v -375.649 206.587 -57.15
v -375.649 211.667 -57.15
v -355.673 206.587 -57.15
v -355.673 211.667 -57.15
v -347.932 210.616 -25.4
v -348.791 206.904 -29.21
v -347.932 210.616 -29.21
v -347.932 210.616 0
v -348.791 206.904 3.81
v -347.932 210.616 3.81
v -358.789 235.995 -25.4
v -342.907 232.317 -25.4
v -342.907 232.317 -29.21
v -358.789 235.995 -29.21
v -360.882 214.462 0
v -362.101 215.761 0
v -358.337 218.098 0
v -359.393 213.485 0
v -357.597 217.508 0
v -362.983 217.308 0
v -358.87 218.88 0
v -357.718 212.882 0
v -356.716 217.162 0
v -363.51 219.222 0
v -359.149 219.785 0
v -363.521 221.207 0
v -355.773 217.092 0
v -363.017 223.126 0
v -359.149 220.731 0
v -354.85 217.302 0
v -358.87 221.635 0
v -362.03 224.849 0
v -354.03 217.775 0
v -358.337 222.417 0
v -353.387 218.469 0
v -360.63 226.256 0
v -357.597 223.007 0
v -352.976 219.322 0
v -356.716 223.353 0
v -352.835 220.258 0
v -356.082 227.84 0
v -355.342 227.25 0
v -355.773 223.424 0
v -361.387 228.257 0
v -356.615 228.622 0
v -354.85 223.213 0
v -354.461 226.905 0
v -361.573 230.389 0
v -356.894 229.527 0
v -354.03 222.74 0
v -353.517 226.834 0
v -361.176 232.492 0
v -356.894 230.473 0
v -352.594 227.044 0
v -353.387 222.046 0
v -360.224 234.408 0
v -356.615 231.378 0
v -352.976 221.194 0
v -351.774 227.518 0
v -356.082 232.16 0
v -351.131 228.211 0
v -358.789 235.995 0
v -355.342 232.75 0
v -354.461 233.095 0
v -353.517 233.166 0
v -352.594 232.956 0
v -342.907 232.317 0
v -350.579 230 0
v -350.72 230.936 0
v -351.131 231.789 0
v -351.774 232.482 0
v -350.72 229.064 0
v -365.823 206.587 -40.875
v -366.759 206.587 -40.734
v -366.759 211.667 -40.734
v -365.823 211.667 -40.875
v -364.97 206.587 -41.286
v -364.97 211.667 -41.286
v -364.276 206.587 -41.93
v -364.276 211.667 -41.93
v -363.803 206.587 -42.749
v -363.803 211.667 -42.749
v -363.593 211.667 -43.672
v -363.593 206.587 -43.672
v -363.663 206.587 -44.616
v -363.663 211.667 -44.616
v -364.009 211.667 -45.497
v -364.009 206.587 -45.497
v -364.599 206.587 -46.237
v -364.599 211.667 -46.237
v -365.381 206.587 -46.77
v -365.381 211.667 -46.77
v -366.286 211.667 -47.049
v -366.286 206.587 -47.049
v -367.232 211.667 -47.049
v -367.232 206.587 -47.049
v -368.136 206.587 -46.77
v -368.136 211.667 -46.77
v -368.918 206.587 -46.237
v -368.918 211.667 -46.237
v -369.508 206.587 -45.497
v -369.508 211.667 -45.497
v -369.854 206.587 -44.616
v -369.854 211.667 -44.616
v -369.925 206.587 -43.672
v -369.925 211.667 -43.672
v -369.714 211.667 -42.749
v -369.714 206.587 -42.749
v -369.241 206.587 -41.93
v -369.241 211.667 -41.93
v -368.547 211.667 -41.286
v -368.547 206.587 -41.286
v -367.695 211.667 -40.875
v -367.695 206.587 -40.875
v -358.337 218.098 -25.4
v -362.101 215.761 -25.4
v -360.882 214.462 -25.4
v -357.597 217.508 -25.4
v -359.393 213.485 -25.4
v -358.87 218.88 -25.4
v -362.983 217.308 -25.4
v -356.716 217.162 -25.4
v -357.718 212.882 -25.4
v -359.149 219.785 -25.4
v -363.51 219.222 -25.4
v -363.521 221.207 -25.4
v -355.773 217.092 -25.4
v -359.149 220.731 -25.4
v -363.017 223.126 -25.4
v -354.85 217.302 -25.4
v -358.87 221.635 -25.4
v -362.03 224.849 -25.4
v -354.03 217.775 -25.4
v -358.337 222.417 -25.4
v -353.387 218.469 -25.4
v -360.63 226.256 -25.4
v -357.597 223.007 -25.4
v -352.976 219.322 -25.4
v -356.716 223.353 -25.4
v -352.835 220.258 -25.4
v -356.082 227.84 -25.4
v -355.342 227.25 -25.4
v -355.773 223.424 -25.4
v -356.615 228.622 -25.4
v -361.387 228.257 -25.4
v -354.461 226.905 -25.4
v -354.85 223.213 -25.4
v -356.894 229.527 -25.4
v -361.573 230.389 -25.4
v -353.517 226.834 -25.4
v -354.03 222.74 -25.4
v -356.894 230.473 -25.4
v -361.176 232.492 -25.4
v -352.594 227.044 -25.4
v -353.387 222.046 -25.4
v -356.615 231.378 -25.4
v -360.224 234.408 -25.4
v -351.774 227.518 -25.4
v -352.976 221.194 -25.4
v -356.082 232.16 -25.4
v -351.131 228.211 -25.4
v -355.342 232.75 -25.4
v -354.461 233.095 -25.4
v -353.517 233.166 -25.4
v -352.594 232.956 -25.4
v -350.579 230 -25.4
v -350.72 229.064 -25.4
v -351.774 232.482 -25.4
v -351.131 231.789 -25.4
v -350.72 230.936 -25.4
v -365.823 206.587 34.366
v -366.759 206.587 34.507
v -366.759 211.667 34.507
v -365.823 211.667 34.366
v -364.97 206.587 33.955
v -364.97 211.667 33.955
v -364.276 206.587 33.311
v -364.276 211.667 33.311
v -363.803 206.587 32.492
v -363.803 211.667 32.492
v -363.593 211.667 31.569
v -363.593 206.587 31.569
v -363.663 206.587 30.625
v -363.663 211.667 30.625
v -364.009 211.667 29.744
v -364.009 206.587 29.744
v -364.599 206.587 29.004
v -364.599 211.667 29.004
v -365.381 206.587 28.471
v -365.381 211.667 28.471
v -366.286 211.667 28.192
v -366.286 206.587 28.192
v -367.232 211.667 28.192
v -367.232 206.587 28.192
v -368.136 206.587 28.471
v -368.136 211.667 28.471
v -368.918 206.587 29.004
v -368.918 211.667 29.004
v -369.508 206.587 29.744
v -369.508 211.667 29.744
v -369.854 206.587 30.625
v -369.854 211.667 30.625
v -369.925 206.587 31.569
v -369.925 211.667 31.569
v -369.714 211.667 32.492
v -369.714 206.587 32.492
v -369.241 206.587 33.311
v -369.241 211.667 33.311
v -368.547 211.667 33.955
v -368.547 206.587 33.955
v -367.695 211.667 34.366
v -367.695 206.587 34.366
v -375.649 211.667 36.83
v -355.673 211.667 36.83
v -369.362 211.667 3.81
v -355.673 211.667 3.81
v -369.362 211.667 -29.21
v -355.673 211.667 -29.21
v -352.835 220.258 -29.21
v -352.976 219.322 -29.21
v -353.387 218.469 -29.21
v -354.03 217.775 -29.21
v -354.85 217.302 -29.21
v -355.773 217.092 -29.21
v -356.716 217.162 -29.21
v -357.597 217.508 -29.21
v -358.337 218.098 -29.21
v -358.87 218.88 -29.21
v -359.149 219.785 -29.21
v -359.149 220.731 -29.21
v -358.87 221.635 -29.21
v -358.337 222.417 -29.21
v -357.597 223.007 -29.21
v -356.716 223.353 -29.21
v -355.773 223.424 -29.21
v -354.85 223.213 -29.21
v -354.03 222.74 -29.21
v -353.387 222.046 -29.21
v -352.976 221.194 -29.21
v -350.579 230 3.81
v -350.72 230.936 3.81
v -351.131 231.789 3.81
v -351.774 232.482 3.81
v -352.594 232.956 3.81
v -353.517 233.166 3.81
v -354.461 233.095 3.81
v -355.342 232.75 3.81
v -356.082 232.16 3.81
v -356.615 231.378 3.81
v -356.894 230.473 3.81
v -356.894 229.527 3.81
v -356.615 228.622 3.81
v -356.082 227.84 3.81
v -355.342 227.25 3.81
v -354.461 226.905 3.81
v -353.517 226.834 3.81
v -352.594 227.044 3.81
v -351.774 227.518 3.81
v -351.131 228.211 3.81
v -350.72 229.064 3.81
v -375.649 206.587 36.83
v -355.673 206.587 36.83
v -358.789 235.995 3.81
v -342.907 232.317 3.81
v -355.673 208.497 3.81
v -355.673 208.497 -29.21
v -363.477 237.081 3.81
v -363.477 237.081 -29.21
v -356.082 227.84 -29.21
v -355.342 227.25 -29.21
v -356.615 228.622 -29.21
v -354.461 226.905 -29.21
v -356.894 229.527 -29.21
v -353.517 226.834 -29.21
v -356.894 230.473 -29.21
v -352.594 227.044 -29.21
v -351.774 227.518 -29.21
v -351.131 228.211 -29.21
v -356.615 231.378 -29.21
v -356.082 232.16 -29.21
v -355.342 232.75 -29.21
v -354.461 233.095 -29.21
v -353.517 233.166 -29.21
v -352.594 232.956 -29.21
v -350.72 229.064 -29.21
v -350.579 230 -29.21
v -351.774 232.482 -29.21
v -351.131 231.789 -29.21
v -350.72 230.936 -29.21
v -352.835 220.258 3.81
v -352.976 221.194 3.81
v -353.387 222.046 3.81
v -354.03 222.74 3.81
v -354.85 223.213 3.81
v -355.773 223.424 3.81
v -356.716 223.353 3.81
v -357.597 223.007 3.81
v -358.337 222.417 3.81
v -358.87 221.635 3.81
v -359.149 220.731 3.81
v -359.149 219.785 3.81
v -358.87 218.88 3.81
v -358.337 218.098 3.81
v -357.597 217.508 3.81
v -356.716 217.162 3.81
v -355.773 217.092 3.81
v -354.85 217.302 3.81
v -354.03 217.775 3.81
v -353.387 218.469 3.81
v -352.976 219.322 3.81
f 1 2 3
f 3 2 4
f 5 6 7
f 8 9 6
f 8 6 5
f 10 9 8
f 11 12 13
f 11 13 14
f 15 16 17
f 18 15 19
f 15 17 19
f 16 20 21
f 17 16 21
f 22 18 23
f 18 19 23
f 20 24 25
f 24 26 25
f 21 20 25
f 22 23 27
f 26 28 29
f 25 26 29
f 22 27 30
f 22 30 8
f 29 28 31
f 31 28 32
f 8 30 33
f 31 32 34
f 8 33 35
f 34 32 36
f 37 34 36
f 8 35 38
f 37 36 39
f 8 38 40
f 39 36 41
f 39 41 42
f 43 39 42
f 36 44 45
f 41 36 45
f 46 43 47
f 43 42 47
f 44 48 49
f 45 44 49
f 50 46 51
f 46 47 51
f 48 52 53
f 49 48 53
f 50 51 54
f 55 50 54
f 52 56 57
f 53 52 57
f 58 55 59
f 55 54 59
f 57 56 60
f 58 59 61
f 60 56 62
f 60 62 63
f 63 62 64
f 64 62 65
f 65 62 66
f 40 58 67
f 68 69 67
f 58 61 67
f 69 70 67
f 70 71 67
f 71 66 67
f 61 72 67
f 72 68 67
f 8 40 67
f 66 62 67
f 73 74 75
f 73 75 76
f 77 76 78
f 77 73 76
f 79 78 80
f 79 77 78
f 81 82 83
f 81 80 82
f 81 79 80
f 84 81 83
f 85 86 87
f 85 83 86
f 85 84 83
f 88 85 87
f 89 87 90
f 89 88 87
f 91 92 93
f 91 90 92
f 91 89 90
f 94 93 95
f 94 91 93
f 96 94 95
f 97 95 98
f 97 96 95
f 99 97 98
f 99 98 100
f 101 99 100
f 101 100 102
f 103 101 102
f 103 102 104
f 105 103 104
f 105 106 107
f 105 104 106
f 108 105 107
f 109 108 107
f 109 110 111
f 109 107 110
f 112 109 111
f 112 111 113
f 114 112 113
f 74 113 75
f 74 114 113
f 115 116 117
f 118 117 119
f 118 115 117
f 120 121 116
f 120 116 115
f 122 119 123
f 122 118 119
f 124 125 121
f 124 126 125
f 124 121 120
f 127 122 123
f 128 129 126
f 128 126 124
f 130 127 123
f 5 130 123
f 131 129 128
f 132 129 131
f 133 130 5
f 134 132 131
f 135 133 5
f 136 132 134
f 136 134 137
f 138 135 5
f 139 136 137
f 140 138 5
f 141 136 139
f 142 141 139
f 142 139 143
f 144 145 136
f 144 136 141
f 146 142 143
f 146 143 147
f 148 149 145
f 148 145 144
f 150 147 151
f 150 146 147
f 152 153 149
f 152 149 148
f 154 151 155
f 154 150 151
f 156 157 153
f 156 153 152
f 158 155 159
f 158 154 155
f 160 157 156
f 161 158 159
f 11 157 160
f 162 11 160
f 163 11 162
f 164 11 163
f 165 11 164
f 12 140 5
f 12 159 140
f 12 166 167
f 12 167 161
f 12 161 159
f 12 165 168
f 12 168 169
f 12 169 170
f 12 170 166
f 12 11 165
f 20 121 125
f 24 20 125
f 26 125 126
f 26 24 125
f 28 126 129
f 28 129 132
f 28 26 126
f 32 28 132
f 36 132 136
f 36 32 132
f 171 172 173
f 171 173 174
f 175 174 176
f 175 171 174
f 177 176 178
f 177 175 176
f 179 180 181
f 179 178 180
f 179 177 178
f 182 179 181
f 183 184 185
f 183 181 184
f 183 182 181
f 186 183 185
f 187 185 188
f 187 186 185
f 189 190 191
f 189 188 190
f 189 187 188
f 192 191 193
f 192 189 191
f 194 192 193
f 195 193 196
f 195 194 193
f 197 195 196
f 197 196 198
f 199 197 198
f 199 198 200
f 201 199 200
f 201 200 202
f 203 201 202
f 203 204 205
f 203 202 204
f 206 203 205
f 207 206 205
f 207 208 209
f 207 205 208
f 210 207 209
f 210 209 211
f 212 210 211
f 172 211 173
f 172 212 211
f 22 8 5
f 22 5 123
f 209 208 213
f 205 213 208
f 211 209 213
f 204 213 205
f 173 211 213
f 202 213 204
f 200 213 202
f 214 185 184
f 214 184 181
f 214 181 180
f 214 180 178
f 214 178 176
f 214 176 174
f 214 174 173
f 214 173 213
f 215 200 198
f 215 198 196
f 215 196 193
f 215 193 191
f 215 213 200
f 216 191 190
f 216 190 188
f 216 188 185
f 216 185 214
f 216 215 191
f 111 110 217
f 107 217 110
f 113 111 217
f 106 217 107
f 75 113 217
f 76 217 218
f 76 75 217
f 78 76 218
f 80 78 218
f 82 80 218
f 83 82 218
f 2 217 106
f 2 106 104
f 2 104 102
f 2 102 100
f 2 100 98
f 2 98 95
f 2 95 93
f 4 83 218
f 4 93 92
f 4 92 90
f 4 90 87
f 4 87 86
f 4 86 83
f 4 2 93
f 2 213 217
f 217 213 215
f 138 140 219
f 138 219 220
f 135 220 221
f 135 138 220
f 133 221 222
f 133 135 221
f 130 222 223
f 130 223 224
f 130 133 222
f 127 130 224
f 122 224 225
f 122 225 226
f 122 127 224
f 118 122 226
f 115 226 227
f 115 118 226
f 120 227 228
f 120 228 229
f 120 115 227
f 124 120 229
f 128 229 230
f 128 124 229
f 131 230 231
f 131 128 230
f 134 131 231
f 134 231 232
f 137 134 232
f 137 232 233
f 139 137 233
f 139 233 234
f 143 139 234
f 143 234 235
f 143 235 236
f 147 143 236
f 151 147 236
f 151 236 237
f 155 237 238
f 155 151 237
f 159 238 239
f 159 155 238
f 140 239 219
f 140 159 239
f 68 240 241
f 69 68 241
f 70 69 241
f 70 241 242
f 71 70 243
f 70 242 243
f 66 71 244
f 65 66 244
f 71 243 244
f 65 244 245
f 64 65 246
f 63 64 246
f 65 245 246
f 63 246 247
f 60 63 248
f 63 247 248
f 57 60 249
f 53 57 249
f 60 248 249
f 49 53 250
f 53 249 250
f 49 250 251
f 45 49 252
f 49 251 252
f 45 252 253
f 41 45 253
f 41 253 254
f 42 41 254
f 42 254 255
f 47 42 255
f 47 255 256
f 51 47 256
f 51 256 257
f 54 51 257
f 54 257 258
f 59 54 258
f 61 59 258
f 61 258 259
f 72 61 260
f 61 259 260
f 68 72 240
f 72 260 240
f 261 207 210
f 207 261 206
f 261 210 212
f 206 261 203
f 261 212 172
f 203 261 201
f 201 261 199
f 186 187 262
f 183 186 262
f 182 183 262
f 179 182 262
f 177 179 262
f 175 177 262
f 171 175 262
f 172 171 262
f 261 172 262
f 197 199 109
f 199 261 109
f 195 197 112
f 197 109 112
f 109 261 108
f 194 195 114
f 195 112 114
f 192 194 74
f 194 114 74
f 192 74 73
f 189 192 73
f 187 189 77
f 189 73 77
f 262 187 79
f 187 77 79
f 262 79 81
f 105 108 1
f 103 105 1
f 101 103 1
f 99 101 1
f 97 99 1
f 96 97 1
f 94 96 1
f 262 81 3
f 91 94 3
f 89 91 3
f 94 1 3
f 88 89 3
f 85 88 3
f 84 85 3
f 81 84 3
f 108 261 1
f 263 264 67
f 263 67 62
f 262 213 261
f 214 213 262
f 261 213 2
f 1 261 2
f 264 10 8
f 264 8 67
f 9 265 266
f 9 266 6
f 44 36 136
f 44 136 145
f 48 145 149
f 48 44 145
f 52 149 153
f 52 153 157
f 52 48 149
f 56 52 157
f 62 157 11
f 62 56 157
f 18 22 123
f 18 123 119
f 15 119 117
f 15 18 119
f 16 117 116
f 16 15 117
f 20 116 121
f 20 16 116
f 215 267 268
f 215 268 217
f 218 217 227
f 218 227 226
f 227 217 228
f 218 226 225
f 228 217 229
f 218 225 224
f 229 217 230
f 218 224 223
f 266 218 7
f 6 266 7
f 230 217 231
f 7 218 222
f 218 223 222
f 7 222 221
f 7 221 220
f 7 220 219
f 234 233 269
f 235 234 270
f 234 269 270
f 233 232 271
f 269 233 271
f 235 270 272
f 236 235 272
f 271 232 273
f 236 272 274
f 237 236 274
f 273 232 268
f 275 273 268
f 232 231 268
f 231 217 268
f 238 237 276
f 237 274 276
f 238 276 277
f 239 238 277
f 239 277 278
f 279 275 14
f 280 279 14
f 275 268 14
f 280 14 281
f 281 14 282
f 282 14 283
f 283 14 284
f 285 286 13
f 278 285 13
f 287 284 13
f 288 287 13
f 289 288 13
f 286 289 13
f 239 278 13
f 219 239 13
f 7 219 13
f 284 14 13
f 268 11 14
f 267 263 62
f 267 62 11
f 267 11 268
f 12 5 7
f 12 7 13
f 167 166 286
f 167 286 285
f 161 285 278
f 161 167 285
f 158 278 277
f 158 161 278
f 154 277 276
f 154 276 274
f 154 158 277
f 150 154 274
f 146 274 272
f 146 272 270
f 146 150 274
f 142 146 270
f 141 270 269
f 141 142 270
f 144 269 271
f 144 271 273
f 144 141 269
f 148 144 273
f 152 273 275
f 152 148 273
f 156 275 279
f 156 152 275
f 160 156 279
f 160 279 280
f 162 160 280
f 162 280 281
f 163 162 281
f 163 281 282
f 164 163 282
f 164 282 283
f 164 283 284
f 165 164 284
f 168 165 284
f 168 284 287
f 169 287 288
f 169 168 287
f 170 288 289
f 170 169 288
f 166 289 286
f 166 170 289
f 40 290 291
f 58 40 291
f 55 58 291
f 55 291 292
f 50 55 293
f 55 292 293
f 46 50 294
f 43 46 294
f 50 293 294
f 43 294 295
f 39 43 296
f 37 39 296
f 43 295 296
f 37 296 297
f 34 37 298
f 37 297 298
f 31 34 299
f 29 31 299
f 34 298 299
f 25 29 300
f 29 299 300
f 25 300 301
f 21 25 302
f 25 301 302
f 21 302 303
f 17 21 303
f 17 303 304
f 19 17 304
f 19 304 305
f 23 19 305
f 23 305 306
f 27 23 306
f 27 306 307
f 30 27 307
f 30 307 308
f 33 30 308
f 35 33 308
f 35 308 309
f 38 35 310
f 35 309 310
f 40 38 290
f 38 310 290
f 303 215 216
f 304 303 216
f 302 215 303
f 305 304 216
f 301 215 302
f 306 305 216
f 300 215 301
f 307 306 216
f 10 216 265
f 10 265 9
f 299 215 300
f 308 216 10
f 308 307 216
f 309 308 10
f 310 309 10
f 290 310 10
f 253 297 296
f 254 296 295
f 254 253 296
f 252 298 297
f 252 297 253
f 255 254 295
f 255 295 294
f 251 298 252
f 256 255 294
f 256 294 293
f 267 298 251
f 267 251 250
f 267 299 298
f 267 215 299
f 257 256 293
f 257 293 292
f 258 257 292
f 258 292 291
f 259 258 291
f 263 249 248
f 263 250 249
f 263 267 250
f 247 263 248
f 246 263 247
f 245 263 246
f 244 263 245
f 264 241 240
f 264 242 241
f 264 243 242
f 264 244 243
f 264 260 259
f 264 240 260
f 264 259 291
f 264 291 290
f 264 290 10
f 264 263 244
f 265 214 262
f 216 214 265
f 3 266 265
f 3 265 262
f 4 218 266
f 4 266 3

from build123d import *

# Parameters (mm, degrees)
BOSS_EXTRUDE1_DEPTH     = 25.4
SKETCH2_R               = 3.175
BOSS_EXTRUDE3_DEPTH     = 3.81
BOSS_EXTRUDE4_START     = 3.81
SKETCH3_R               = 3.175
BOSS_EXTRUDE4_DEPTH     = 3.81
SKETCH4_W               = 19.976191583
SKETCH4_H               = 93.98
BOSS_EXTRUDE5_DEPTH     = 5.08
CUT_EXTRUDE1_DEPTH      = 5.08
CUT_EXTRUDE1_DEPTH_BACK = 381.820097899
SKETCH5_R               = 3.175


with BuildPart() as part:
    # Sketch1 → Boss-Extrude1 (new body)
    with BuildSketch(Plane.XY):
        with BuildLine():
            Line((-348.791316574, 206.904032246), (-347.931840304, 210.615824339))
            Line((-347.931840304, 210.615824339), (-357.71784023, 212.881801123))
            ThreePointArc((-357.71784023, 212.881801123), (-360.881852793, 214.462416261), (-362.982664296, 217.307747657))
            ThreePointArc((-362.982664296, 217.307747657), (-363.332122594, 222.183147168), (-360.629697113, 226.256050065))
            ThreePointArc((-360.629697113, 226.256050065), (-361.446766946, 231.453900041), (-358.789055407, 235.995025106))
            Line((-358.789055407, 235.995025106), (-363.476973871, 237.08052628))
            Line((-363.476973871, 237.08052628), (-369.361521397, 211.667123083))
            Line((-369.361521397, 211.667123083), (-348.791316574, 206.904032246))
        make_face()
    extrude(amount=-BOSS_EXTRUDE1_DEPTH)

    # Sketch2 → Boss-Extrude3 (add)
    # profile 1 of 2: a face of its own
    with BuildSketch(Plane(origin=(0, 0, -25.4), x_dir=(-1, 0, 0), z_dir=(0, 0, -1))):
        with BuildLine():
            Line((342.906769048, 232.317435443), (358.789055407, 235.995025106))
            ThreePointArc((358.789055407, 235.995025106), (361.446766946, 231.453900041), (360.629697113, 226.256050065))
            ThreePointArc((360.629697113, 226.256050065), (363.40772554, 218.647103628), (357.71784023, 212.881801123))
            Line((357.71784023, 212.881801123), (347.931840304, 210.615824339))
            Line((347.931840304, 210.615824339), (342.906769048, 232.317435443))
        make_face()
        with Locations(Location((353.754071424, 230, 0), (0, 0, 180))):
            Circle(SKETCH2_R, mode=Mode.SUBTRACT)
        with Locations(Location((356.009914651, 220.257763535, 0), (0, 0, 180))):
            Circle(SKETCH2_R, mode=Mode.SUBTRACT)
    # profile 2 of 2: a face of its own
    with BuildSketch(Plane(origin=(0, 0, -25.4), x_dir=(-1, 0, 0), z_dir=(0, 0, -1))):
        with BuildLine():
            ThreePointArc((360.629697113, 226.256050065), (363.40772554, 218.647103628), (357.71784023, 212.881801123))
            Line((357.71784023, 212.881801123), (347.931840304, 210.615824339))
            Line((347.931840304, 210.615824339), (348.791316574, 206.904032246))
            Line((348.791316574, 206.904032246), (369.361521397, 211.667123083))
            Line((369.361521397, 211.667123083), (363.476973871, 237.08052628))
            Line((363.476973871, 237.08052628), (358.789055407, 235.995025106))
            ThreePointArc((358.789055407, 235.995025106), (361.446766946, 231.453900041), (360.629697113, 226.256050065))
        make_face()
    extrude(amount=BOSS_EXTRUDE3_DEPTH)

    # Sketch3 → Boss-Extrude4 (add)
    # profile 1 of 2: a face of its own
    with BuildSketch(Plane.XY.offset(BOSS_EXTRUDE4_START)):
        with BuildLine():
            Line((-342.906769048, 232.317435443), (-358.789055407, 235.995025106))
            ThreePointArc((-358.789055407, 235.995025106), (-361.446766946, 231.453900041), (-360.629697113, 226.256050065))
            ThreePointArc((-360.629697113, 226.256050065), (-363.40772554, 218.647103628), (-357.71784023, 212.881801123))
            Line((-357.71784023, 212.881801123), (-347.931840304, 210.615824339))
            Line((-347.931840304, 210.615824339), (-342.906769048, 232.317435443))
        make_face()
        with Locations((-356.009914651, 220.257763535)):
            Circle(SKETCH3_R, mode=Mode.SUBTRACT)
        with Locations((-353.754071424, 230)):
            Circle(SKETCH3_R, mode=Mode.SUBTRACT)
    # profile 2 of 2: a face of its own
    with BuildSketch(Plane.XY.offset(BOSS_EXTRUDE4_START)):
        with BuildLine():
            Line((-347.931840304, 210.615824339), (-357.71784023, 212.881801123))
            ThreePointArc((-357.71784023, 212.881801123), (-363.40772554, 218.647103628), (-360.629697113, 226.256050065))
            ThreePointArc((-360.629697113, 226.256050065), (-361.446766946, 231.453900041), (-358.789055407, 235.995025106))
            Line((-358.789055407, 235.995025106), (-363.476973871, 237.08052628))
            Line((-363.476973871, 237.08052628), (-369.361521397, 211.667123083))
            Line((-369.361521397, 211.667123083), (-348.791316574, 206.904032246))
            Line((-348.791316574, 206.904032246), (-347.931840304, 210.615824339))
        make_face()
    extrude(amount=-BOSS_EXTRUDE4_DEPTH)

    # Sketch4 → Boss-Extrude5 (add)
    with BuildSketch(Plane(origin=(0, 211.667123083, 0), x_dir=(1, 0, 0), z_dir=(0, 1, 0))):
        with Locations((-365.660654241, 10.16)):
            Rectangle(SKETCH4_W, SKETCH4_H)
    extrude(amount=-BOSS_EXTRUDE5_DEPTH)

    # Sketch5 → Cut-Extrude1 (cut, two sides: drawn at the far end of the back side and taken through both)
    with BuildSketch(Plane(origin=(0, 211.667123083, 0), x_dir=(1, 0, 0), z_dir=(0, 1, 0)).offset(-CUT_EXTRUDE1_DEPTH_BACK)):
        with Locations(Location((-366.758750033, 43.909082713, 0), (0, 0, 270))):
            Circle(SKETCH5_R)
        with Locations(Location((-366.758750033, -31.331908304, 0), (0, 0, 270))):
            Circle(SKETCH5_R)
    extrude(amount=CUT_EXTRUDE1_DEPTH + CUT_EXTRUDE1_DEPTH_BACK, mode=Mode.SUBTRACT)


solid = part.part
